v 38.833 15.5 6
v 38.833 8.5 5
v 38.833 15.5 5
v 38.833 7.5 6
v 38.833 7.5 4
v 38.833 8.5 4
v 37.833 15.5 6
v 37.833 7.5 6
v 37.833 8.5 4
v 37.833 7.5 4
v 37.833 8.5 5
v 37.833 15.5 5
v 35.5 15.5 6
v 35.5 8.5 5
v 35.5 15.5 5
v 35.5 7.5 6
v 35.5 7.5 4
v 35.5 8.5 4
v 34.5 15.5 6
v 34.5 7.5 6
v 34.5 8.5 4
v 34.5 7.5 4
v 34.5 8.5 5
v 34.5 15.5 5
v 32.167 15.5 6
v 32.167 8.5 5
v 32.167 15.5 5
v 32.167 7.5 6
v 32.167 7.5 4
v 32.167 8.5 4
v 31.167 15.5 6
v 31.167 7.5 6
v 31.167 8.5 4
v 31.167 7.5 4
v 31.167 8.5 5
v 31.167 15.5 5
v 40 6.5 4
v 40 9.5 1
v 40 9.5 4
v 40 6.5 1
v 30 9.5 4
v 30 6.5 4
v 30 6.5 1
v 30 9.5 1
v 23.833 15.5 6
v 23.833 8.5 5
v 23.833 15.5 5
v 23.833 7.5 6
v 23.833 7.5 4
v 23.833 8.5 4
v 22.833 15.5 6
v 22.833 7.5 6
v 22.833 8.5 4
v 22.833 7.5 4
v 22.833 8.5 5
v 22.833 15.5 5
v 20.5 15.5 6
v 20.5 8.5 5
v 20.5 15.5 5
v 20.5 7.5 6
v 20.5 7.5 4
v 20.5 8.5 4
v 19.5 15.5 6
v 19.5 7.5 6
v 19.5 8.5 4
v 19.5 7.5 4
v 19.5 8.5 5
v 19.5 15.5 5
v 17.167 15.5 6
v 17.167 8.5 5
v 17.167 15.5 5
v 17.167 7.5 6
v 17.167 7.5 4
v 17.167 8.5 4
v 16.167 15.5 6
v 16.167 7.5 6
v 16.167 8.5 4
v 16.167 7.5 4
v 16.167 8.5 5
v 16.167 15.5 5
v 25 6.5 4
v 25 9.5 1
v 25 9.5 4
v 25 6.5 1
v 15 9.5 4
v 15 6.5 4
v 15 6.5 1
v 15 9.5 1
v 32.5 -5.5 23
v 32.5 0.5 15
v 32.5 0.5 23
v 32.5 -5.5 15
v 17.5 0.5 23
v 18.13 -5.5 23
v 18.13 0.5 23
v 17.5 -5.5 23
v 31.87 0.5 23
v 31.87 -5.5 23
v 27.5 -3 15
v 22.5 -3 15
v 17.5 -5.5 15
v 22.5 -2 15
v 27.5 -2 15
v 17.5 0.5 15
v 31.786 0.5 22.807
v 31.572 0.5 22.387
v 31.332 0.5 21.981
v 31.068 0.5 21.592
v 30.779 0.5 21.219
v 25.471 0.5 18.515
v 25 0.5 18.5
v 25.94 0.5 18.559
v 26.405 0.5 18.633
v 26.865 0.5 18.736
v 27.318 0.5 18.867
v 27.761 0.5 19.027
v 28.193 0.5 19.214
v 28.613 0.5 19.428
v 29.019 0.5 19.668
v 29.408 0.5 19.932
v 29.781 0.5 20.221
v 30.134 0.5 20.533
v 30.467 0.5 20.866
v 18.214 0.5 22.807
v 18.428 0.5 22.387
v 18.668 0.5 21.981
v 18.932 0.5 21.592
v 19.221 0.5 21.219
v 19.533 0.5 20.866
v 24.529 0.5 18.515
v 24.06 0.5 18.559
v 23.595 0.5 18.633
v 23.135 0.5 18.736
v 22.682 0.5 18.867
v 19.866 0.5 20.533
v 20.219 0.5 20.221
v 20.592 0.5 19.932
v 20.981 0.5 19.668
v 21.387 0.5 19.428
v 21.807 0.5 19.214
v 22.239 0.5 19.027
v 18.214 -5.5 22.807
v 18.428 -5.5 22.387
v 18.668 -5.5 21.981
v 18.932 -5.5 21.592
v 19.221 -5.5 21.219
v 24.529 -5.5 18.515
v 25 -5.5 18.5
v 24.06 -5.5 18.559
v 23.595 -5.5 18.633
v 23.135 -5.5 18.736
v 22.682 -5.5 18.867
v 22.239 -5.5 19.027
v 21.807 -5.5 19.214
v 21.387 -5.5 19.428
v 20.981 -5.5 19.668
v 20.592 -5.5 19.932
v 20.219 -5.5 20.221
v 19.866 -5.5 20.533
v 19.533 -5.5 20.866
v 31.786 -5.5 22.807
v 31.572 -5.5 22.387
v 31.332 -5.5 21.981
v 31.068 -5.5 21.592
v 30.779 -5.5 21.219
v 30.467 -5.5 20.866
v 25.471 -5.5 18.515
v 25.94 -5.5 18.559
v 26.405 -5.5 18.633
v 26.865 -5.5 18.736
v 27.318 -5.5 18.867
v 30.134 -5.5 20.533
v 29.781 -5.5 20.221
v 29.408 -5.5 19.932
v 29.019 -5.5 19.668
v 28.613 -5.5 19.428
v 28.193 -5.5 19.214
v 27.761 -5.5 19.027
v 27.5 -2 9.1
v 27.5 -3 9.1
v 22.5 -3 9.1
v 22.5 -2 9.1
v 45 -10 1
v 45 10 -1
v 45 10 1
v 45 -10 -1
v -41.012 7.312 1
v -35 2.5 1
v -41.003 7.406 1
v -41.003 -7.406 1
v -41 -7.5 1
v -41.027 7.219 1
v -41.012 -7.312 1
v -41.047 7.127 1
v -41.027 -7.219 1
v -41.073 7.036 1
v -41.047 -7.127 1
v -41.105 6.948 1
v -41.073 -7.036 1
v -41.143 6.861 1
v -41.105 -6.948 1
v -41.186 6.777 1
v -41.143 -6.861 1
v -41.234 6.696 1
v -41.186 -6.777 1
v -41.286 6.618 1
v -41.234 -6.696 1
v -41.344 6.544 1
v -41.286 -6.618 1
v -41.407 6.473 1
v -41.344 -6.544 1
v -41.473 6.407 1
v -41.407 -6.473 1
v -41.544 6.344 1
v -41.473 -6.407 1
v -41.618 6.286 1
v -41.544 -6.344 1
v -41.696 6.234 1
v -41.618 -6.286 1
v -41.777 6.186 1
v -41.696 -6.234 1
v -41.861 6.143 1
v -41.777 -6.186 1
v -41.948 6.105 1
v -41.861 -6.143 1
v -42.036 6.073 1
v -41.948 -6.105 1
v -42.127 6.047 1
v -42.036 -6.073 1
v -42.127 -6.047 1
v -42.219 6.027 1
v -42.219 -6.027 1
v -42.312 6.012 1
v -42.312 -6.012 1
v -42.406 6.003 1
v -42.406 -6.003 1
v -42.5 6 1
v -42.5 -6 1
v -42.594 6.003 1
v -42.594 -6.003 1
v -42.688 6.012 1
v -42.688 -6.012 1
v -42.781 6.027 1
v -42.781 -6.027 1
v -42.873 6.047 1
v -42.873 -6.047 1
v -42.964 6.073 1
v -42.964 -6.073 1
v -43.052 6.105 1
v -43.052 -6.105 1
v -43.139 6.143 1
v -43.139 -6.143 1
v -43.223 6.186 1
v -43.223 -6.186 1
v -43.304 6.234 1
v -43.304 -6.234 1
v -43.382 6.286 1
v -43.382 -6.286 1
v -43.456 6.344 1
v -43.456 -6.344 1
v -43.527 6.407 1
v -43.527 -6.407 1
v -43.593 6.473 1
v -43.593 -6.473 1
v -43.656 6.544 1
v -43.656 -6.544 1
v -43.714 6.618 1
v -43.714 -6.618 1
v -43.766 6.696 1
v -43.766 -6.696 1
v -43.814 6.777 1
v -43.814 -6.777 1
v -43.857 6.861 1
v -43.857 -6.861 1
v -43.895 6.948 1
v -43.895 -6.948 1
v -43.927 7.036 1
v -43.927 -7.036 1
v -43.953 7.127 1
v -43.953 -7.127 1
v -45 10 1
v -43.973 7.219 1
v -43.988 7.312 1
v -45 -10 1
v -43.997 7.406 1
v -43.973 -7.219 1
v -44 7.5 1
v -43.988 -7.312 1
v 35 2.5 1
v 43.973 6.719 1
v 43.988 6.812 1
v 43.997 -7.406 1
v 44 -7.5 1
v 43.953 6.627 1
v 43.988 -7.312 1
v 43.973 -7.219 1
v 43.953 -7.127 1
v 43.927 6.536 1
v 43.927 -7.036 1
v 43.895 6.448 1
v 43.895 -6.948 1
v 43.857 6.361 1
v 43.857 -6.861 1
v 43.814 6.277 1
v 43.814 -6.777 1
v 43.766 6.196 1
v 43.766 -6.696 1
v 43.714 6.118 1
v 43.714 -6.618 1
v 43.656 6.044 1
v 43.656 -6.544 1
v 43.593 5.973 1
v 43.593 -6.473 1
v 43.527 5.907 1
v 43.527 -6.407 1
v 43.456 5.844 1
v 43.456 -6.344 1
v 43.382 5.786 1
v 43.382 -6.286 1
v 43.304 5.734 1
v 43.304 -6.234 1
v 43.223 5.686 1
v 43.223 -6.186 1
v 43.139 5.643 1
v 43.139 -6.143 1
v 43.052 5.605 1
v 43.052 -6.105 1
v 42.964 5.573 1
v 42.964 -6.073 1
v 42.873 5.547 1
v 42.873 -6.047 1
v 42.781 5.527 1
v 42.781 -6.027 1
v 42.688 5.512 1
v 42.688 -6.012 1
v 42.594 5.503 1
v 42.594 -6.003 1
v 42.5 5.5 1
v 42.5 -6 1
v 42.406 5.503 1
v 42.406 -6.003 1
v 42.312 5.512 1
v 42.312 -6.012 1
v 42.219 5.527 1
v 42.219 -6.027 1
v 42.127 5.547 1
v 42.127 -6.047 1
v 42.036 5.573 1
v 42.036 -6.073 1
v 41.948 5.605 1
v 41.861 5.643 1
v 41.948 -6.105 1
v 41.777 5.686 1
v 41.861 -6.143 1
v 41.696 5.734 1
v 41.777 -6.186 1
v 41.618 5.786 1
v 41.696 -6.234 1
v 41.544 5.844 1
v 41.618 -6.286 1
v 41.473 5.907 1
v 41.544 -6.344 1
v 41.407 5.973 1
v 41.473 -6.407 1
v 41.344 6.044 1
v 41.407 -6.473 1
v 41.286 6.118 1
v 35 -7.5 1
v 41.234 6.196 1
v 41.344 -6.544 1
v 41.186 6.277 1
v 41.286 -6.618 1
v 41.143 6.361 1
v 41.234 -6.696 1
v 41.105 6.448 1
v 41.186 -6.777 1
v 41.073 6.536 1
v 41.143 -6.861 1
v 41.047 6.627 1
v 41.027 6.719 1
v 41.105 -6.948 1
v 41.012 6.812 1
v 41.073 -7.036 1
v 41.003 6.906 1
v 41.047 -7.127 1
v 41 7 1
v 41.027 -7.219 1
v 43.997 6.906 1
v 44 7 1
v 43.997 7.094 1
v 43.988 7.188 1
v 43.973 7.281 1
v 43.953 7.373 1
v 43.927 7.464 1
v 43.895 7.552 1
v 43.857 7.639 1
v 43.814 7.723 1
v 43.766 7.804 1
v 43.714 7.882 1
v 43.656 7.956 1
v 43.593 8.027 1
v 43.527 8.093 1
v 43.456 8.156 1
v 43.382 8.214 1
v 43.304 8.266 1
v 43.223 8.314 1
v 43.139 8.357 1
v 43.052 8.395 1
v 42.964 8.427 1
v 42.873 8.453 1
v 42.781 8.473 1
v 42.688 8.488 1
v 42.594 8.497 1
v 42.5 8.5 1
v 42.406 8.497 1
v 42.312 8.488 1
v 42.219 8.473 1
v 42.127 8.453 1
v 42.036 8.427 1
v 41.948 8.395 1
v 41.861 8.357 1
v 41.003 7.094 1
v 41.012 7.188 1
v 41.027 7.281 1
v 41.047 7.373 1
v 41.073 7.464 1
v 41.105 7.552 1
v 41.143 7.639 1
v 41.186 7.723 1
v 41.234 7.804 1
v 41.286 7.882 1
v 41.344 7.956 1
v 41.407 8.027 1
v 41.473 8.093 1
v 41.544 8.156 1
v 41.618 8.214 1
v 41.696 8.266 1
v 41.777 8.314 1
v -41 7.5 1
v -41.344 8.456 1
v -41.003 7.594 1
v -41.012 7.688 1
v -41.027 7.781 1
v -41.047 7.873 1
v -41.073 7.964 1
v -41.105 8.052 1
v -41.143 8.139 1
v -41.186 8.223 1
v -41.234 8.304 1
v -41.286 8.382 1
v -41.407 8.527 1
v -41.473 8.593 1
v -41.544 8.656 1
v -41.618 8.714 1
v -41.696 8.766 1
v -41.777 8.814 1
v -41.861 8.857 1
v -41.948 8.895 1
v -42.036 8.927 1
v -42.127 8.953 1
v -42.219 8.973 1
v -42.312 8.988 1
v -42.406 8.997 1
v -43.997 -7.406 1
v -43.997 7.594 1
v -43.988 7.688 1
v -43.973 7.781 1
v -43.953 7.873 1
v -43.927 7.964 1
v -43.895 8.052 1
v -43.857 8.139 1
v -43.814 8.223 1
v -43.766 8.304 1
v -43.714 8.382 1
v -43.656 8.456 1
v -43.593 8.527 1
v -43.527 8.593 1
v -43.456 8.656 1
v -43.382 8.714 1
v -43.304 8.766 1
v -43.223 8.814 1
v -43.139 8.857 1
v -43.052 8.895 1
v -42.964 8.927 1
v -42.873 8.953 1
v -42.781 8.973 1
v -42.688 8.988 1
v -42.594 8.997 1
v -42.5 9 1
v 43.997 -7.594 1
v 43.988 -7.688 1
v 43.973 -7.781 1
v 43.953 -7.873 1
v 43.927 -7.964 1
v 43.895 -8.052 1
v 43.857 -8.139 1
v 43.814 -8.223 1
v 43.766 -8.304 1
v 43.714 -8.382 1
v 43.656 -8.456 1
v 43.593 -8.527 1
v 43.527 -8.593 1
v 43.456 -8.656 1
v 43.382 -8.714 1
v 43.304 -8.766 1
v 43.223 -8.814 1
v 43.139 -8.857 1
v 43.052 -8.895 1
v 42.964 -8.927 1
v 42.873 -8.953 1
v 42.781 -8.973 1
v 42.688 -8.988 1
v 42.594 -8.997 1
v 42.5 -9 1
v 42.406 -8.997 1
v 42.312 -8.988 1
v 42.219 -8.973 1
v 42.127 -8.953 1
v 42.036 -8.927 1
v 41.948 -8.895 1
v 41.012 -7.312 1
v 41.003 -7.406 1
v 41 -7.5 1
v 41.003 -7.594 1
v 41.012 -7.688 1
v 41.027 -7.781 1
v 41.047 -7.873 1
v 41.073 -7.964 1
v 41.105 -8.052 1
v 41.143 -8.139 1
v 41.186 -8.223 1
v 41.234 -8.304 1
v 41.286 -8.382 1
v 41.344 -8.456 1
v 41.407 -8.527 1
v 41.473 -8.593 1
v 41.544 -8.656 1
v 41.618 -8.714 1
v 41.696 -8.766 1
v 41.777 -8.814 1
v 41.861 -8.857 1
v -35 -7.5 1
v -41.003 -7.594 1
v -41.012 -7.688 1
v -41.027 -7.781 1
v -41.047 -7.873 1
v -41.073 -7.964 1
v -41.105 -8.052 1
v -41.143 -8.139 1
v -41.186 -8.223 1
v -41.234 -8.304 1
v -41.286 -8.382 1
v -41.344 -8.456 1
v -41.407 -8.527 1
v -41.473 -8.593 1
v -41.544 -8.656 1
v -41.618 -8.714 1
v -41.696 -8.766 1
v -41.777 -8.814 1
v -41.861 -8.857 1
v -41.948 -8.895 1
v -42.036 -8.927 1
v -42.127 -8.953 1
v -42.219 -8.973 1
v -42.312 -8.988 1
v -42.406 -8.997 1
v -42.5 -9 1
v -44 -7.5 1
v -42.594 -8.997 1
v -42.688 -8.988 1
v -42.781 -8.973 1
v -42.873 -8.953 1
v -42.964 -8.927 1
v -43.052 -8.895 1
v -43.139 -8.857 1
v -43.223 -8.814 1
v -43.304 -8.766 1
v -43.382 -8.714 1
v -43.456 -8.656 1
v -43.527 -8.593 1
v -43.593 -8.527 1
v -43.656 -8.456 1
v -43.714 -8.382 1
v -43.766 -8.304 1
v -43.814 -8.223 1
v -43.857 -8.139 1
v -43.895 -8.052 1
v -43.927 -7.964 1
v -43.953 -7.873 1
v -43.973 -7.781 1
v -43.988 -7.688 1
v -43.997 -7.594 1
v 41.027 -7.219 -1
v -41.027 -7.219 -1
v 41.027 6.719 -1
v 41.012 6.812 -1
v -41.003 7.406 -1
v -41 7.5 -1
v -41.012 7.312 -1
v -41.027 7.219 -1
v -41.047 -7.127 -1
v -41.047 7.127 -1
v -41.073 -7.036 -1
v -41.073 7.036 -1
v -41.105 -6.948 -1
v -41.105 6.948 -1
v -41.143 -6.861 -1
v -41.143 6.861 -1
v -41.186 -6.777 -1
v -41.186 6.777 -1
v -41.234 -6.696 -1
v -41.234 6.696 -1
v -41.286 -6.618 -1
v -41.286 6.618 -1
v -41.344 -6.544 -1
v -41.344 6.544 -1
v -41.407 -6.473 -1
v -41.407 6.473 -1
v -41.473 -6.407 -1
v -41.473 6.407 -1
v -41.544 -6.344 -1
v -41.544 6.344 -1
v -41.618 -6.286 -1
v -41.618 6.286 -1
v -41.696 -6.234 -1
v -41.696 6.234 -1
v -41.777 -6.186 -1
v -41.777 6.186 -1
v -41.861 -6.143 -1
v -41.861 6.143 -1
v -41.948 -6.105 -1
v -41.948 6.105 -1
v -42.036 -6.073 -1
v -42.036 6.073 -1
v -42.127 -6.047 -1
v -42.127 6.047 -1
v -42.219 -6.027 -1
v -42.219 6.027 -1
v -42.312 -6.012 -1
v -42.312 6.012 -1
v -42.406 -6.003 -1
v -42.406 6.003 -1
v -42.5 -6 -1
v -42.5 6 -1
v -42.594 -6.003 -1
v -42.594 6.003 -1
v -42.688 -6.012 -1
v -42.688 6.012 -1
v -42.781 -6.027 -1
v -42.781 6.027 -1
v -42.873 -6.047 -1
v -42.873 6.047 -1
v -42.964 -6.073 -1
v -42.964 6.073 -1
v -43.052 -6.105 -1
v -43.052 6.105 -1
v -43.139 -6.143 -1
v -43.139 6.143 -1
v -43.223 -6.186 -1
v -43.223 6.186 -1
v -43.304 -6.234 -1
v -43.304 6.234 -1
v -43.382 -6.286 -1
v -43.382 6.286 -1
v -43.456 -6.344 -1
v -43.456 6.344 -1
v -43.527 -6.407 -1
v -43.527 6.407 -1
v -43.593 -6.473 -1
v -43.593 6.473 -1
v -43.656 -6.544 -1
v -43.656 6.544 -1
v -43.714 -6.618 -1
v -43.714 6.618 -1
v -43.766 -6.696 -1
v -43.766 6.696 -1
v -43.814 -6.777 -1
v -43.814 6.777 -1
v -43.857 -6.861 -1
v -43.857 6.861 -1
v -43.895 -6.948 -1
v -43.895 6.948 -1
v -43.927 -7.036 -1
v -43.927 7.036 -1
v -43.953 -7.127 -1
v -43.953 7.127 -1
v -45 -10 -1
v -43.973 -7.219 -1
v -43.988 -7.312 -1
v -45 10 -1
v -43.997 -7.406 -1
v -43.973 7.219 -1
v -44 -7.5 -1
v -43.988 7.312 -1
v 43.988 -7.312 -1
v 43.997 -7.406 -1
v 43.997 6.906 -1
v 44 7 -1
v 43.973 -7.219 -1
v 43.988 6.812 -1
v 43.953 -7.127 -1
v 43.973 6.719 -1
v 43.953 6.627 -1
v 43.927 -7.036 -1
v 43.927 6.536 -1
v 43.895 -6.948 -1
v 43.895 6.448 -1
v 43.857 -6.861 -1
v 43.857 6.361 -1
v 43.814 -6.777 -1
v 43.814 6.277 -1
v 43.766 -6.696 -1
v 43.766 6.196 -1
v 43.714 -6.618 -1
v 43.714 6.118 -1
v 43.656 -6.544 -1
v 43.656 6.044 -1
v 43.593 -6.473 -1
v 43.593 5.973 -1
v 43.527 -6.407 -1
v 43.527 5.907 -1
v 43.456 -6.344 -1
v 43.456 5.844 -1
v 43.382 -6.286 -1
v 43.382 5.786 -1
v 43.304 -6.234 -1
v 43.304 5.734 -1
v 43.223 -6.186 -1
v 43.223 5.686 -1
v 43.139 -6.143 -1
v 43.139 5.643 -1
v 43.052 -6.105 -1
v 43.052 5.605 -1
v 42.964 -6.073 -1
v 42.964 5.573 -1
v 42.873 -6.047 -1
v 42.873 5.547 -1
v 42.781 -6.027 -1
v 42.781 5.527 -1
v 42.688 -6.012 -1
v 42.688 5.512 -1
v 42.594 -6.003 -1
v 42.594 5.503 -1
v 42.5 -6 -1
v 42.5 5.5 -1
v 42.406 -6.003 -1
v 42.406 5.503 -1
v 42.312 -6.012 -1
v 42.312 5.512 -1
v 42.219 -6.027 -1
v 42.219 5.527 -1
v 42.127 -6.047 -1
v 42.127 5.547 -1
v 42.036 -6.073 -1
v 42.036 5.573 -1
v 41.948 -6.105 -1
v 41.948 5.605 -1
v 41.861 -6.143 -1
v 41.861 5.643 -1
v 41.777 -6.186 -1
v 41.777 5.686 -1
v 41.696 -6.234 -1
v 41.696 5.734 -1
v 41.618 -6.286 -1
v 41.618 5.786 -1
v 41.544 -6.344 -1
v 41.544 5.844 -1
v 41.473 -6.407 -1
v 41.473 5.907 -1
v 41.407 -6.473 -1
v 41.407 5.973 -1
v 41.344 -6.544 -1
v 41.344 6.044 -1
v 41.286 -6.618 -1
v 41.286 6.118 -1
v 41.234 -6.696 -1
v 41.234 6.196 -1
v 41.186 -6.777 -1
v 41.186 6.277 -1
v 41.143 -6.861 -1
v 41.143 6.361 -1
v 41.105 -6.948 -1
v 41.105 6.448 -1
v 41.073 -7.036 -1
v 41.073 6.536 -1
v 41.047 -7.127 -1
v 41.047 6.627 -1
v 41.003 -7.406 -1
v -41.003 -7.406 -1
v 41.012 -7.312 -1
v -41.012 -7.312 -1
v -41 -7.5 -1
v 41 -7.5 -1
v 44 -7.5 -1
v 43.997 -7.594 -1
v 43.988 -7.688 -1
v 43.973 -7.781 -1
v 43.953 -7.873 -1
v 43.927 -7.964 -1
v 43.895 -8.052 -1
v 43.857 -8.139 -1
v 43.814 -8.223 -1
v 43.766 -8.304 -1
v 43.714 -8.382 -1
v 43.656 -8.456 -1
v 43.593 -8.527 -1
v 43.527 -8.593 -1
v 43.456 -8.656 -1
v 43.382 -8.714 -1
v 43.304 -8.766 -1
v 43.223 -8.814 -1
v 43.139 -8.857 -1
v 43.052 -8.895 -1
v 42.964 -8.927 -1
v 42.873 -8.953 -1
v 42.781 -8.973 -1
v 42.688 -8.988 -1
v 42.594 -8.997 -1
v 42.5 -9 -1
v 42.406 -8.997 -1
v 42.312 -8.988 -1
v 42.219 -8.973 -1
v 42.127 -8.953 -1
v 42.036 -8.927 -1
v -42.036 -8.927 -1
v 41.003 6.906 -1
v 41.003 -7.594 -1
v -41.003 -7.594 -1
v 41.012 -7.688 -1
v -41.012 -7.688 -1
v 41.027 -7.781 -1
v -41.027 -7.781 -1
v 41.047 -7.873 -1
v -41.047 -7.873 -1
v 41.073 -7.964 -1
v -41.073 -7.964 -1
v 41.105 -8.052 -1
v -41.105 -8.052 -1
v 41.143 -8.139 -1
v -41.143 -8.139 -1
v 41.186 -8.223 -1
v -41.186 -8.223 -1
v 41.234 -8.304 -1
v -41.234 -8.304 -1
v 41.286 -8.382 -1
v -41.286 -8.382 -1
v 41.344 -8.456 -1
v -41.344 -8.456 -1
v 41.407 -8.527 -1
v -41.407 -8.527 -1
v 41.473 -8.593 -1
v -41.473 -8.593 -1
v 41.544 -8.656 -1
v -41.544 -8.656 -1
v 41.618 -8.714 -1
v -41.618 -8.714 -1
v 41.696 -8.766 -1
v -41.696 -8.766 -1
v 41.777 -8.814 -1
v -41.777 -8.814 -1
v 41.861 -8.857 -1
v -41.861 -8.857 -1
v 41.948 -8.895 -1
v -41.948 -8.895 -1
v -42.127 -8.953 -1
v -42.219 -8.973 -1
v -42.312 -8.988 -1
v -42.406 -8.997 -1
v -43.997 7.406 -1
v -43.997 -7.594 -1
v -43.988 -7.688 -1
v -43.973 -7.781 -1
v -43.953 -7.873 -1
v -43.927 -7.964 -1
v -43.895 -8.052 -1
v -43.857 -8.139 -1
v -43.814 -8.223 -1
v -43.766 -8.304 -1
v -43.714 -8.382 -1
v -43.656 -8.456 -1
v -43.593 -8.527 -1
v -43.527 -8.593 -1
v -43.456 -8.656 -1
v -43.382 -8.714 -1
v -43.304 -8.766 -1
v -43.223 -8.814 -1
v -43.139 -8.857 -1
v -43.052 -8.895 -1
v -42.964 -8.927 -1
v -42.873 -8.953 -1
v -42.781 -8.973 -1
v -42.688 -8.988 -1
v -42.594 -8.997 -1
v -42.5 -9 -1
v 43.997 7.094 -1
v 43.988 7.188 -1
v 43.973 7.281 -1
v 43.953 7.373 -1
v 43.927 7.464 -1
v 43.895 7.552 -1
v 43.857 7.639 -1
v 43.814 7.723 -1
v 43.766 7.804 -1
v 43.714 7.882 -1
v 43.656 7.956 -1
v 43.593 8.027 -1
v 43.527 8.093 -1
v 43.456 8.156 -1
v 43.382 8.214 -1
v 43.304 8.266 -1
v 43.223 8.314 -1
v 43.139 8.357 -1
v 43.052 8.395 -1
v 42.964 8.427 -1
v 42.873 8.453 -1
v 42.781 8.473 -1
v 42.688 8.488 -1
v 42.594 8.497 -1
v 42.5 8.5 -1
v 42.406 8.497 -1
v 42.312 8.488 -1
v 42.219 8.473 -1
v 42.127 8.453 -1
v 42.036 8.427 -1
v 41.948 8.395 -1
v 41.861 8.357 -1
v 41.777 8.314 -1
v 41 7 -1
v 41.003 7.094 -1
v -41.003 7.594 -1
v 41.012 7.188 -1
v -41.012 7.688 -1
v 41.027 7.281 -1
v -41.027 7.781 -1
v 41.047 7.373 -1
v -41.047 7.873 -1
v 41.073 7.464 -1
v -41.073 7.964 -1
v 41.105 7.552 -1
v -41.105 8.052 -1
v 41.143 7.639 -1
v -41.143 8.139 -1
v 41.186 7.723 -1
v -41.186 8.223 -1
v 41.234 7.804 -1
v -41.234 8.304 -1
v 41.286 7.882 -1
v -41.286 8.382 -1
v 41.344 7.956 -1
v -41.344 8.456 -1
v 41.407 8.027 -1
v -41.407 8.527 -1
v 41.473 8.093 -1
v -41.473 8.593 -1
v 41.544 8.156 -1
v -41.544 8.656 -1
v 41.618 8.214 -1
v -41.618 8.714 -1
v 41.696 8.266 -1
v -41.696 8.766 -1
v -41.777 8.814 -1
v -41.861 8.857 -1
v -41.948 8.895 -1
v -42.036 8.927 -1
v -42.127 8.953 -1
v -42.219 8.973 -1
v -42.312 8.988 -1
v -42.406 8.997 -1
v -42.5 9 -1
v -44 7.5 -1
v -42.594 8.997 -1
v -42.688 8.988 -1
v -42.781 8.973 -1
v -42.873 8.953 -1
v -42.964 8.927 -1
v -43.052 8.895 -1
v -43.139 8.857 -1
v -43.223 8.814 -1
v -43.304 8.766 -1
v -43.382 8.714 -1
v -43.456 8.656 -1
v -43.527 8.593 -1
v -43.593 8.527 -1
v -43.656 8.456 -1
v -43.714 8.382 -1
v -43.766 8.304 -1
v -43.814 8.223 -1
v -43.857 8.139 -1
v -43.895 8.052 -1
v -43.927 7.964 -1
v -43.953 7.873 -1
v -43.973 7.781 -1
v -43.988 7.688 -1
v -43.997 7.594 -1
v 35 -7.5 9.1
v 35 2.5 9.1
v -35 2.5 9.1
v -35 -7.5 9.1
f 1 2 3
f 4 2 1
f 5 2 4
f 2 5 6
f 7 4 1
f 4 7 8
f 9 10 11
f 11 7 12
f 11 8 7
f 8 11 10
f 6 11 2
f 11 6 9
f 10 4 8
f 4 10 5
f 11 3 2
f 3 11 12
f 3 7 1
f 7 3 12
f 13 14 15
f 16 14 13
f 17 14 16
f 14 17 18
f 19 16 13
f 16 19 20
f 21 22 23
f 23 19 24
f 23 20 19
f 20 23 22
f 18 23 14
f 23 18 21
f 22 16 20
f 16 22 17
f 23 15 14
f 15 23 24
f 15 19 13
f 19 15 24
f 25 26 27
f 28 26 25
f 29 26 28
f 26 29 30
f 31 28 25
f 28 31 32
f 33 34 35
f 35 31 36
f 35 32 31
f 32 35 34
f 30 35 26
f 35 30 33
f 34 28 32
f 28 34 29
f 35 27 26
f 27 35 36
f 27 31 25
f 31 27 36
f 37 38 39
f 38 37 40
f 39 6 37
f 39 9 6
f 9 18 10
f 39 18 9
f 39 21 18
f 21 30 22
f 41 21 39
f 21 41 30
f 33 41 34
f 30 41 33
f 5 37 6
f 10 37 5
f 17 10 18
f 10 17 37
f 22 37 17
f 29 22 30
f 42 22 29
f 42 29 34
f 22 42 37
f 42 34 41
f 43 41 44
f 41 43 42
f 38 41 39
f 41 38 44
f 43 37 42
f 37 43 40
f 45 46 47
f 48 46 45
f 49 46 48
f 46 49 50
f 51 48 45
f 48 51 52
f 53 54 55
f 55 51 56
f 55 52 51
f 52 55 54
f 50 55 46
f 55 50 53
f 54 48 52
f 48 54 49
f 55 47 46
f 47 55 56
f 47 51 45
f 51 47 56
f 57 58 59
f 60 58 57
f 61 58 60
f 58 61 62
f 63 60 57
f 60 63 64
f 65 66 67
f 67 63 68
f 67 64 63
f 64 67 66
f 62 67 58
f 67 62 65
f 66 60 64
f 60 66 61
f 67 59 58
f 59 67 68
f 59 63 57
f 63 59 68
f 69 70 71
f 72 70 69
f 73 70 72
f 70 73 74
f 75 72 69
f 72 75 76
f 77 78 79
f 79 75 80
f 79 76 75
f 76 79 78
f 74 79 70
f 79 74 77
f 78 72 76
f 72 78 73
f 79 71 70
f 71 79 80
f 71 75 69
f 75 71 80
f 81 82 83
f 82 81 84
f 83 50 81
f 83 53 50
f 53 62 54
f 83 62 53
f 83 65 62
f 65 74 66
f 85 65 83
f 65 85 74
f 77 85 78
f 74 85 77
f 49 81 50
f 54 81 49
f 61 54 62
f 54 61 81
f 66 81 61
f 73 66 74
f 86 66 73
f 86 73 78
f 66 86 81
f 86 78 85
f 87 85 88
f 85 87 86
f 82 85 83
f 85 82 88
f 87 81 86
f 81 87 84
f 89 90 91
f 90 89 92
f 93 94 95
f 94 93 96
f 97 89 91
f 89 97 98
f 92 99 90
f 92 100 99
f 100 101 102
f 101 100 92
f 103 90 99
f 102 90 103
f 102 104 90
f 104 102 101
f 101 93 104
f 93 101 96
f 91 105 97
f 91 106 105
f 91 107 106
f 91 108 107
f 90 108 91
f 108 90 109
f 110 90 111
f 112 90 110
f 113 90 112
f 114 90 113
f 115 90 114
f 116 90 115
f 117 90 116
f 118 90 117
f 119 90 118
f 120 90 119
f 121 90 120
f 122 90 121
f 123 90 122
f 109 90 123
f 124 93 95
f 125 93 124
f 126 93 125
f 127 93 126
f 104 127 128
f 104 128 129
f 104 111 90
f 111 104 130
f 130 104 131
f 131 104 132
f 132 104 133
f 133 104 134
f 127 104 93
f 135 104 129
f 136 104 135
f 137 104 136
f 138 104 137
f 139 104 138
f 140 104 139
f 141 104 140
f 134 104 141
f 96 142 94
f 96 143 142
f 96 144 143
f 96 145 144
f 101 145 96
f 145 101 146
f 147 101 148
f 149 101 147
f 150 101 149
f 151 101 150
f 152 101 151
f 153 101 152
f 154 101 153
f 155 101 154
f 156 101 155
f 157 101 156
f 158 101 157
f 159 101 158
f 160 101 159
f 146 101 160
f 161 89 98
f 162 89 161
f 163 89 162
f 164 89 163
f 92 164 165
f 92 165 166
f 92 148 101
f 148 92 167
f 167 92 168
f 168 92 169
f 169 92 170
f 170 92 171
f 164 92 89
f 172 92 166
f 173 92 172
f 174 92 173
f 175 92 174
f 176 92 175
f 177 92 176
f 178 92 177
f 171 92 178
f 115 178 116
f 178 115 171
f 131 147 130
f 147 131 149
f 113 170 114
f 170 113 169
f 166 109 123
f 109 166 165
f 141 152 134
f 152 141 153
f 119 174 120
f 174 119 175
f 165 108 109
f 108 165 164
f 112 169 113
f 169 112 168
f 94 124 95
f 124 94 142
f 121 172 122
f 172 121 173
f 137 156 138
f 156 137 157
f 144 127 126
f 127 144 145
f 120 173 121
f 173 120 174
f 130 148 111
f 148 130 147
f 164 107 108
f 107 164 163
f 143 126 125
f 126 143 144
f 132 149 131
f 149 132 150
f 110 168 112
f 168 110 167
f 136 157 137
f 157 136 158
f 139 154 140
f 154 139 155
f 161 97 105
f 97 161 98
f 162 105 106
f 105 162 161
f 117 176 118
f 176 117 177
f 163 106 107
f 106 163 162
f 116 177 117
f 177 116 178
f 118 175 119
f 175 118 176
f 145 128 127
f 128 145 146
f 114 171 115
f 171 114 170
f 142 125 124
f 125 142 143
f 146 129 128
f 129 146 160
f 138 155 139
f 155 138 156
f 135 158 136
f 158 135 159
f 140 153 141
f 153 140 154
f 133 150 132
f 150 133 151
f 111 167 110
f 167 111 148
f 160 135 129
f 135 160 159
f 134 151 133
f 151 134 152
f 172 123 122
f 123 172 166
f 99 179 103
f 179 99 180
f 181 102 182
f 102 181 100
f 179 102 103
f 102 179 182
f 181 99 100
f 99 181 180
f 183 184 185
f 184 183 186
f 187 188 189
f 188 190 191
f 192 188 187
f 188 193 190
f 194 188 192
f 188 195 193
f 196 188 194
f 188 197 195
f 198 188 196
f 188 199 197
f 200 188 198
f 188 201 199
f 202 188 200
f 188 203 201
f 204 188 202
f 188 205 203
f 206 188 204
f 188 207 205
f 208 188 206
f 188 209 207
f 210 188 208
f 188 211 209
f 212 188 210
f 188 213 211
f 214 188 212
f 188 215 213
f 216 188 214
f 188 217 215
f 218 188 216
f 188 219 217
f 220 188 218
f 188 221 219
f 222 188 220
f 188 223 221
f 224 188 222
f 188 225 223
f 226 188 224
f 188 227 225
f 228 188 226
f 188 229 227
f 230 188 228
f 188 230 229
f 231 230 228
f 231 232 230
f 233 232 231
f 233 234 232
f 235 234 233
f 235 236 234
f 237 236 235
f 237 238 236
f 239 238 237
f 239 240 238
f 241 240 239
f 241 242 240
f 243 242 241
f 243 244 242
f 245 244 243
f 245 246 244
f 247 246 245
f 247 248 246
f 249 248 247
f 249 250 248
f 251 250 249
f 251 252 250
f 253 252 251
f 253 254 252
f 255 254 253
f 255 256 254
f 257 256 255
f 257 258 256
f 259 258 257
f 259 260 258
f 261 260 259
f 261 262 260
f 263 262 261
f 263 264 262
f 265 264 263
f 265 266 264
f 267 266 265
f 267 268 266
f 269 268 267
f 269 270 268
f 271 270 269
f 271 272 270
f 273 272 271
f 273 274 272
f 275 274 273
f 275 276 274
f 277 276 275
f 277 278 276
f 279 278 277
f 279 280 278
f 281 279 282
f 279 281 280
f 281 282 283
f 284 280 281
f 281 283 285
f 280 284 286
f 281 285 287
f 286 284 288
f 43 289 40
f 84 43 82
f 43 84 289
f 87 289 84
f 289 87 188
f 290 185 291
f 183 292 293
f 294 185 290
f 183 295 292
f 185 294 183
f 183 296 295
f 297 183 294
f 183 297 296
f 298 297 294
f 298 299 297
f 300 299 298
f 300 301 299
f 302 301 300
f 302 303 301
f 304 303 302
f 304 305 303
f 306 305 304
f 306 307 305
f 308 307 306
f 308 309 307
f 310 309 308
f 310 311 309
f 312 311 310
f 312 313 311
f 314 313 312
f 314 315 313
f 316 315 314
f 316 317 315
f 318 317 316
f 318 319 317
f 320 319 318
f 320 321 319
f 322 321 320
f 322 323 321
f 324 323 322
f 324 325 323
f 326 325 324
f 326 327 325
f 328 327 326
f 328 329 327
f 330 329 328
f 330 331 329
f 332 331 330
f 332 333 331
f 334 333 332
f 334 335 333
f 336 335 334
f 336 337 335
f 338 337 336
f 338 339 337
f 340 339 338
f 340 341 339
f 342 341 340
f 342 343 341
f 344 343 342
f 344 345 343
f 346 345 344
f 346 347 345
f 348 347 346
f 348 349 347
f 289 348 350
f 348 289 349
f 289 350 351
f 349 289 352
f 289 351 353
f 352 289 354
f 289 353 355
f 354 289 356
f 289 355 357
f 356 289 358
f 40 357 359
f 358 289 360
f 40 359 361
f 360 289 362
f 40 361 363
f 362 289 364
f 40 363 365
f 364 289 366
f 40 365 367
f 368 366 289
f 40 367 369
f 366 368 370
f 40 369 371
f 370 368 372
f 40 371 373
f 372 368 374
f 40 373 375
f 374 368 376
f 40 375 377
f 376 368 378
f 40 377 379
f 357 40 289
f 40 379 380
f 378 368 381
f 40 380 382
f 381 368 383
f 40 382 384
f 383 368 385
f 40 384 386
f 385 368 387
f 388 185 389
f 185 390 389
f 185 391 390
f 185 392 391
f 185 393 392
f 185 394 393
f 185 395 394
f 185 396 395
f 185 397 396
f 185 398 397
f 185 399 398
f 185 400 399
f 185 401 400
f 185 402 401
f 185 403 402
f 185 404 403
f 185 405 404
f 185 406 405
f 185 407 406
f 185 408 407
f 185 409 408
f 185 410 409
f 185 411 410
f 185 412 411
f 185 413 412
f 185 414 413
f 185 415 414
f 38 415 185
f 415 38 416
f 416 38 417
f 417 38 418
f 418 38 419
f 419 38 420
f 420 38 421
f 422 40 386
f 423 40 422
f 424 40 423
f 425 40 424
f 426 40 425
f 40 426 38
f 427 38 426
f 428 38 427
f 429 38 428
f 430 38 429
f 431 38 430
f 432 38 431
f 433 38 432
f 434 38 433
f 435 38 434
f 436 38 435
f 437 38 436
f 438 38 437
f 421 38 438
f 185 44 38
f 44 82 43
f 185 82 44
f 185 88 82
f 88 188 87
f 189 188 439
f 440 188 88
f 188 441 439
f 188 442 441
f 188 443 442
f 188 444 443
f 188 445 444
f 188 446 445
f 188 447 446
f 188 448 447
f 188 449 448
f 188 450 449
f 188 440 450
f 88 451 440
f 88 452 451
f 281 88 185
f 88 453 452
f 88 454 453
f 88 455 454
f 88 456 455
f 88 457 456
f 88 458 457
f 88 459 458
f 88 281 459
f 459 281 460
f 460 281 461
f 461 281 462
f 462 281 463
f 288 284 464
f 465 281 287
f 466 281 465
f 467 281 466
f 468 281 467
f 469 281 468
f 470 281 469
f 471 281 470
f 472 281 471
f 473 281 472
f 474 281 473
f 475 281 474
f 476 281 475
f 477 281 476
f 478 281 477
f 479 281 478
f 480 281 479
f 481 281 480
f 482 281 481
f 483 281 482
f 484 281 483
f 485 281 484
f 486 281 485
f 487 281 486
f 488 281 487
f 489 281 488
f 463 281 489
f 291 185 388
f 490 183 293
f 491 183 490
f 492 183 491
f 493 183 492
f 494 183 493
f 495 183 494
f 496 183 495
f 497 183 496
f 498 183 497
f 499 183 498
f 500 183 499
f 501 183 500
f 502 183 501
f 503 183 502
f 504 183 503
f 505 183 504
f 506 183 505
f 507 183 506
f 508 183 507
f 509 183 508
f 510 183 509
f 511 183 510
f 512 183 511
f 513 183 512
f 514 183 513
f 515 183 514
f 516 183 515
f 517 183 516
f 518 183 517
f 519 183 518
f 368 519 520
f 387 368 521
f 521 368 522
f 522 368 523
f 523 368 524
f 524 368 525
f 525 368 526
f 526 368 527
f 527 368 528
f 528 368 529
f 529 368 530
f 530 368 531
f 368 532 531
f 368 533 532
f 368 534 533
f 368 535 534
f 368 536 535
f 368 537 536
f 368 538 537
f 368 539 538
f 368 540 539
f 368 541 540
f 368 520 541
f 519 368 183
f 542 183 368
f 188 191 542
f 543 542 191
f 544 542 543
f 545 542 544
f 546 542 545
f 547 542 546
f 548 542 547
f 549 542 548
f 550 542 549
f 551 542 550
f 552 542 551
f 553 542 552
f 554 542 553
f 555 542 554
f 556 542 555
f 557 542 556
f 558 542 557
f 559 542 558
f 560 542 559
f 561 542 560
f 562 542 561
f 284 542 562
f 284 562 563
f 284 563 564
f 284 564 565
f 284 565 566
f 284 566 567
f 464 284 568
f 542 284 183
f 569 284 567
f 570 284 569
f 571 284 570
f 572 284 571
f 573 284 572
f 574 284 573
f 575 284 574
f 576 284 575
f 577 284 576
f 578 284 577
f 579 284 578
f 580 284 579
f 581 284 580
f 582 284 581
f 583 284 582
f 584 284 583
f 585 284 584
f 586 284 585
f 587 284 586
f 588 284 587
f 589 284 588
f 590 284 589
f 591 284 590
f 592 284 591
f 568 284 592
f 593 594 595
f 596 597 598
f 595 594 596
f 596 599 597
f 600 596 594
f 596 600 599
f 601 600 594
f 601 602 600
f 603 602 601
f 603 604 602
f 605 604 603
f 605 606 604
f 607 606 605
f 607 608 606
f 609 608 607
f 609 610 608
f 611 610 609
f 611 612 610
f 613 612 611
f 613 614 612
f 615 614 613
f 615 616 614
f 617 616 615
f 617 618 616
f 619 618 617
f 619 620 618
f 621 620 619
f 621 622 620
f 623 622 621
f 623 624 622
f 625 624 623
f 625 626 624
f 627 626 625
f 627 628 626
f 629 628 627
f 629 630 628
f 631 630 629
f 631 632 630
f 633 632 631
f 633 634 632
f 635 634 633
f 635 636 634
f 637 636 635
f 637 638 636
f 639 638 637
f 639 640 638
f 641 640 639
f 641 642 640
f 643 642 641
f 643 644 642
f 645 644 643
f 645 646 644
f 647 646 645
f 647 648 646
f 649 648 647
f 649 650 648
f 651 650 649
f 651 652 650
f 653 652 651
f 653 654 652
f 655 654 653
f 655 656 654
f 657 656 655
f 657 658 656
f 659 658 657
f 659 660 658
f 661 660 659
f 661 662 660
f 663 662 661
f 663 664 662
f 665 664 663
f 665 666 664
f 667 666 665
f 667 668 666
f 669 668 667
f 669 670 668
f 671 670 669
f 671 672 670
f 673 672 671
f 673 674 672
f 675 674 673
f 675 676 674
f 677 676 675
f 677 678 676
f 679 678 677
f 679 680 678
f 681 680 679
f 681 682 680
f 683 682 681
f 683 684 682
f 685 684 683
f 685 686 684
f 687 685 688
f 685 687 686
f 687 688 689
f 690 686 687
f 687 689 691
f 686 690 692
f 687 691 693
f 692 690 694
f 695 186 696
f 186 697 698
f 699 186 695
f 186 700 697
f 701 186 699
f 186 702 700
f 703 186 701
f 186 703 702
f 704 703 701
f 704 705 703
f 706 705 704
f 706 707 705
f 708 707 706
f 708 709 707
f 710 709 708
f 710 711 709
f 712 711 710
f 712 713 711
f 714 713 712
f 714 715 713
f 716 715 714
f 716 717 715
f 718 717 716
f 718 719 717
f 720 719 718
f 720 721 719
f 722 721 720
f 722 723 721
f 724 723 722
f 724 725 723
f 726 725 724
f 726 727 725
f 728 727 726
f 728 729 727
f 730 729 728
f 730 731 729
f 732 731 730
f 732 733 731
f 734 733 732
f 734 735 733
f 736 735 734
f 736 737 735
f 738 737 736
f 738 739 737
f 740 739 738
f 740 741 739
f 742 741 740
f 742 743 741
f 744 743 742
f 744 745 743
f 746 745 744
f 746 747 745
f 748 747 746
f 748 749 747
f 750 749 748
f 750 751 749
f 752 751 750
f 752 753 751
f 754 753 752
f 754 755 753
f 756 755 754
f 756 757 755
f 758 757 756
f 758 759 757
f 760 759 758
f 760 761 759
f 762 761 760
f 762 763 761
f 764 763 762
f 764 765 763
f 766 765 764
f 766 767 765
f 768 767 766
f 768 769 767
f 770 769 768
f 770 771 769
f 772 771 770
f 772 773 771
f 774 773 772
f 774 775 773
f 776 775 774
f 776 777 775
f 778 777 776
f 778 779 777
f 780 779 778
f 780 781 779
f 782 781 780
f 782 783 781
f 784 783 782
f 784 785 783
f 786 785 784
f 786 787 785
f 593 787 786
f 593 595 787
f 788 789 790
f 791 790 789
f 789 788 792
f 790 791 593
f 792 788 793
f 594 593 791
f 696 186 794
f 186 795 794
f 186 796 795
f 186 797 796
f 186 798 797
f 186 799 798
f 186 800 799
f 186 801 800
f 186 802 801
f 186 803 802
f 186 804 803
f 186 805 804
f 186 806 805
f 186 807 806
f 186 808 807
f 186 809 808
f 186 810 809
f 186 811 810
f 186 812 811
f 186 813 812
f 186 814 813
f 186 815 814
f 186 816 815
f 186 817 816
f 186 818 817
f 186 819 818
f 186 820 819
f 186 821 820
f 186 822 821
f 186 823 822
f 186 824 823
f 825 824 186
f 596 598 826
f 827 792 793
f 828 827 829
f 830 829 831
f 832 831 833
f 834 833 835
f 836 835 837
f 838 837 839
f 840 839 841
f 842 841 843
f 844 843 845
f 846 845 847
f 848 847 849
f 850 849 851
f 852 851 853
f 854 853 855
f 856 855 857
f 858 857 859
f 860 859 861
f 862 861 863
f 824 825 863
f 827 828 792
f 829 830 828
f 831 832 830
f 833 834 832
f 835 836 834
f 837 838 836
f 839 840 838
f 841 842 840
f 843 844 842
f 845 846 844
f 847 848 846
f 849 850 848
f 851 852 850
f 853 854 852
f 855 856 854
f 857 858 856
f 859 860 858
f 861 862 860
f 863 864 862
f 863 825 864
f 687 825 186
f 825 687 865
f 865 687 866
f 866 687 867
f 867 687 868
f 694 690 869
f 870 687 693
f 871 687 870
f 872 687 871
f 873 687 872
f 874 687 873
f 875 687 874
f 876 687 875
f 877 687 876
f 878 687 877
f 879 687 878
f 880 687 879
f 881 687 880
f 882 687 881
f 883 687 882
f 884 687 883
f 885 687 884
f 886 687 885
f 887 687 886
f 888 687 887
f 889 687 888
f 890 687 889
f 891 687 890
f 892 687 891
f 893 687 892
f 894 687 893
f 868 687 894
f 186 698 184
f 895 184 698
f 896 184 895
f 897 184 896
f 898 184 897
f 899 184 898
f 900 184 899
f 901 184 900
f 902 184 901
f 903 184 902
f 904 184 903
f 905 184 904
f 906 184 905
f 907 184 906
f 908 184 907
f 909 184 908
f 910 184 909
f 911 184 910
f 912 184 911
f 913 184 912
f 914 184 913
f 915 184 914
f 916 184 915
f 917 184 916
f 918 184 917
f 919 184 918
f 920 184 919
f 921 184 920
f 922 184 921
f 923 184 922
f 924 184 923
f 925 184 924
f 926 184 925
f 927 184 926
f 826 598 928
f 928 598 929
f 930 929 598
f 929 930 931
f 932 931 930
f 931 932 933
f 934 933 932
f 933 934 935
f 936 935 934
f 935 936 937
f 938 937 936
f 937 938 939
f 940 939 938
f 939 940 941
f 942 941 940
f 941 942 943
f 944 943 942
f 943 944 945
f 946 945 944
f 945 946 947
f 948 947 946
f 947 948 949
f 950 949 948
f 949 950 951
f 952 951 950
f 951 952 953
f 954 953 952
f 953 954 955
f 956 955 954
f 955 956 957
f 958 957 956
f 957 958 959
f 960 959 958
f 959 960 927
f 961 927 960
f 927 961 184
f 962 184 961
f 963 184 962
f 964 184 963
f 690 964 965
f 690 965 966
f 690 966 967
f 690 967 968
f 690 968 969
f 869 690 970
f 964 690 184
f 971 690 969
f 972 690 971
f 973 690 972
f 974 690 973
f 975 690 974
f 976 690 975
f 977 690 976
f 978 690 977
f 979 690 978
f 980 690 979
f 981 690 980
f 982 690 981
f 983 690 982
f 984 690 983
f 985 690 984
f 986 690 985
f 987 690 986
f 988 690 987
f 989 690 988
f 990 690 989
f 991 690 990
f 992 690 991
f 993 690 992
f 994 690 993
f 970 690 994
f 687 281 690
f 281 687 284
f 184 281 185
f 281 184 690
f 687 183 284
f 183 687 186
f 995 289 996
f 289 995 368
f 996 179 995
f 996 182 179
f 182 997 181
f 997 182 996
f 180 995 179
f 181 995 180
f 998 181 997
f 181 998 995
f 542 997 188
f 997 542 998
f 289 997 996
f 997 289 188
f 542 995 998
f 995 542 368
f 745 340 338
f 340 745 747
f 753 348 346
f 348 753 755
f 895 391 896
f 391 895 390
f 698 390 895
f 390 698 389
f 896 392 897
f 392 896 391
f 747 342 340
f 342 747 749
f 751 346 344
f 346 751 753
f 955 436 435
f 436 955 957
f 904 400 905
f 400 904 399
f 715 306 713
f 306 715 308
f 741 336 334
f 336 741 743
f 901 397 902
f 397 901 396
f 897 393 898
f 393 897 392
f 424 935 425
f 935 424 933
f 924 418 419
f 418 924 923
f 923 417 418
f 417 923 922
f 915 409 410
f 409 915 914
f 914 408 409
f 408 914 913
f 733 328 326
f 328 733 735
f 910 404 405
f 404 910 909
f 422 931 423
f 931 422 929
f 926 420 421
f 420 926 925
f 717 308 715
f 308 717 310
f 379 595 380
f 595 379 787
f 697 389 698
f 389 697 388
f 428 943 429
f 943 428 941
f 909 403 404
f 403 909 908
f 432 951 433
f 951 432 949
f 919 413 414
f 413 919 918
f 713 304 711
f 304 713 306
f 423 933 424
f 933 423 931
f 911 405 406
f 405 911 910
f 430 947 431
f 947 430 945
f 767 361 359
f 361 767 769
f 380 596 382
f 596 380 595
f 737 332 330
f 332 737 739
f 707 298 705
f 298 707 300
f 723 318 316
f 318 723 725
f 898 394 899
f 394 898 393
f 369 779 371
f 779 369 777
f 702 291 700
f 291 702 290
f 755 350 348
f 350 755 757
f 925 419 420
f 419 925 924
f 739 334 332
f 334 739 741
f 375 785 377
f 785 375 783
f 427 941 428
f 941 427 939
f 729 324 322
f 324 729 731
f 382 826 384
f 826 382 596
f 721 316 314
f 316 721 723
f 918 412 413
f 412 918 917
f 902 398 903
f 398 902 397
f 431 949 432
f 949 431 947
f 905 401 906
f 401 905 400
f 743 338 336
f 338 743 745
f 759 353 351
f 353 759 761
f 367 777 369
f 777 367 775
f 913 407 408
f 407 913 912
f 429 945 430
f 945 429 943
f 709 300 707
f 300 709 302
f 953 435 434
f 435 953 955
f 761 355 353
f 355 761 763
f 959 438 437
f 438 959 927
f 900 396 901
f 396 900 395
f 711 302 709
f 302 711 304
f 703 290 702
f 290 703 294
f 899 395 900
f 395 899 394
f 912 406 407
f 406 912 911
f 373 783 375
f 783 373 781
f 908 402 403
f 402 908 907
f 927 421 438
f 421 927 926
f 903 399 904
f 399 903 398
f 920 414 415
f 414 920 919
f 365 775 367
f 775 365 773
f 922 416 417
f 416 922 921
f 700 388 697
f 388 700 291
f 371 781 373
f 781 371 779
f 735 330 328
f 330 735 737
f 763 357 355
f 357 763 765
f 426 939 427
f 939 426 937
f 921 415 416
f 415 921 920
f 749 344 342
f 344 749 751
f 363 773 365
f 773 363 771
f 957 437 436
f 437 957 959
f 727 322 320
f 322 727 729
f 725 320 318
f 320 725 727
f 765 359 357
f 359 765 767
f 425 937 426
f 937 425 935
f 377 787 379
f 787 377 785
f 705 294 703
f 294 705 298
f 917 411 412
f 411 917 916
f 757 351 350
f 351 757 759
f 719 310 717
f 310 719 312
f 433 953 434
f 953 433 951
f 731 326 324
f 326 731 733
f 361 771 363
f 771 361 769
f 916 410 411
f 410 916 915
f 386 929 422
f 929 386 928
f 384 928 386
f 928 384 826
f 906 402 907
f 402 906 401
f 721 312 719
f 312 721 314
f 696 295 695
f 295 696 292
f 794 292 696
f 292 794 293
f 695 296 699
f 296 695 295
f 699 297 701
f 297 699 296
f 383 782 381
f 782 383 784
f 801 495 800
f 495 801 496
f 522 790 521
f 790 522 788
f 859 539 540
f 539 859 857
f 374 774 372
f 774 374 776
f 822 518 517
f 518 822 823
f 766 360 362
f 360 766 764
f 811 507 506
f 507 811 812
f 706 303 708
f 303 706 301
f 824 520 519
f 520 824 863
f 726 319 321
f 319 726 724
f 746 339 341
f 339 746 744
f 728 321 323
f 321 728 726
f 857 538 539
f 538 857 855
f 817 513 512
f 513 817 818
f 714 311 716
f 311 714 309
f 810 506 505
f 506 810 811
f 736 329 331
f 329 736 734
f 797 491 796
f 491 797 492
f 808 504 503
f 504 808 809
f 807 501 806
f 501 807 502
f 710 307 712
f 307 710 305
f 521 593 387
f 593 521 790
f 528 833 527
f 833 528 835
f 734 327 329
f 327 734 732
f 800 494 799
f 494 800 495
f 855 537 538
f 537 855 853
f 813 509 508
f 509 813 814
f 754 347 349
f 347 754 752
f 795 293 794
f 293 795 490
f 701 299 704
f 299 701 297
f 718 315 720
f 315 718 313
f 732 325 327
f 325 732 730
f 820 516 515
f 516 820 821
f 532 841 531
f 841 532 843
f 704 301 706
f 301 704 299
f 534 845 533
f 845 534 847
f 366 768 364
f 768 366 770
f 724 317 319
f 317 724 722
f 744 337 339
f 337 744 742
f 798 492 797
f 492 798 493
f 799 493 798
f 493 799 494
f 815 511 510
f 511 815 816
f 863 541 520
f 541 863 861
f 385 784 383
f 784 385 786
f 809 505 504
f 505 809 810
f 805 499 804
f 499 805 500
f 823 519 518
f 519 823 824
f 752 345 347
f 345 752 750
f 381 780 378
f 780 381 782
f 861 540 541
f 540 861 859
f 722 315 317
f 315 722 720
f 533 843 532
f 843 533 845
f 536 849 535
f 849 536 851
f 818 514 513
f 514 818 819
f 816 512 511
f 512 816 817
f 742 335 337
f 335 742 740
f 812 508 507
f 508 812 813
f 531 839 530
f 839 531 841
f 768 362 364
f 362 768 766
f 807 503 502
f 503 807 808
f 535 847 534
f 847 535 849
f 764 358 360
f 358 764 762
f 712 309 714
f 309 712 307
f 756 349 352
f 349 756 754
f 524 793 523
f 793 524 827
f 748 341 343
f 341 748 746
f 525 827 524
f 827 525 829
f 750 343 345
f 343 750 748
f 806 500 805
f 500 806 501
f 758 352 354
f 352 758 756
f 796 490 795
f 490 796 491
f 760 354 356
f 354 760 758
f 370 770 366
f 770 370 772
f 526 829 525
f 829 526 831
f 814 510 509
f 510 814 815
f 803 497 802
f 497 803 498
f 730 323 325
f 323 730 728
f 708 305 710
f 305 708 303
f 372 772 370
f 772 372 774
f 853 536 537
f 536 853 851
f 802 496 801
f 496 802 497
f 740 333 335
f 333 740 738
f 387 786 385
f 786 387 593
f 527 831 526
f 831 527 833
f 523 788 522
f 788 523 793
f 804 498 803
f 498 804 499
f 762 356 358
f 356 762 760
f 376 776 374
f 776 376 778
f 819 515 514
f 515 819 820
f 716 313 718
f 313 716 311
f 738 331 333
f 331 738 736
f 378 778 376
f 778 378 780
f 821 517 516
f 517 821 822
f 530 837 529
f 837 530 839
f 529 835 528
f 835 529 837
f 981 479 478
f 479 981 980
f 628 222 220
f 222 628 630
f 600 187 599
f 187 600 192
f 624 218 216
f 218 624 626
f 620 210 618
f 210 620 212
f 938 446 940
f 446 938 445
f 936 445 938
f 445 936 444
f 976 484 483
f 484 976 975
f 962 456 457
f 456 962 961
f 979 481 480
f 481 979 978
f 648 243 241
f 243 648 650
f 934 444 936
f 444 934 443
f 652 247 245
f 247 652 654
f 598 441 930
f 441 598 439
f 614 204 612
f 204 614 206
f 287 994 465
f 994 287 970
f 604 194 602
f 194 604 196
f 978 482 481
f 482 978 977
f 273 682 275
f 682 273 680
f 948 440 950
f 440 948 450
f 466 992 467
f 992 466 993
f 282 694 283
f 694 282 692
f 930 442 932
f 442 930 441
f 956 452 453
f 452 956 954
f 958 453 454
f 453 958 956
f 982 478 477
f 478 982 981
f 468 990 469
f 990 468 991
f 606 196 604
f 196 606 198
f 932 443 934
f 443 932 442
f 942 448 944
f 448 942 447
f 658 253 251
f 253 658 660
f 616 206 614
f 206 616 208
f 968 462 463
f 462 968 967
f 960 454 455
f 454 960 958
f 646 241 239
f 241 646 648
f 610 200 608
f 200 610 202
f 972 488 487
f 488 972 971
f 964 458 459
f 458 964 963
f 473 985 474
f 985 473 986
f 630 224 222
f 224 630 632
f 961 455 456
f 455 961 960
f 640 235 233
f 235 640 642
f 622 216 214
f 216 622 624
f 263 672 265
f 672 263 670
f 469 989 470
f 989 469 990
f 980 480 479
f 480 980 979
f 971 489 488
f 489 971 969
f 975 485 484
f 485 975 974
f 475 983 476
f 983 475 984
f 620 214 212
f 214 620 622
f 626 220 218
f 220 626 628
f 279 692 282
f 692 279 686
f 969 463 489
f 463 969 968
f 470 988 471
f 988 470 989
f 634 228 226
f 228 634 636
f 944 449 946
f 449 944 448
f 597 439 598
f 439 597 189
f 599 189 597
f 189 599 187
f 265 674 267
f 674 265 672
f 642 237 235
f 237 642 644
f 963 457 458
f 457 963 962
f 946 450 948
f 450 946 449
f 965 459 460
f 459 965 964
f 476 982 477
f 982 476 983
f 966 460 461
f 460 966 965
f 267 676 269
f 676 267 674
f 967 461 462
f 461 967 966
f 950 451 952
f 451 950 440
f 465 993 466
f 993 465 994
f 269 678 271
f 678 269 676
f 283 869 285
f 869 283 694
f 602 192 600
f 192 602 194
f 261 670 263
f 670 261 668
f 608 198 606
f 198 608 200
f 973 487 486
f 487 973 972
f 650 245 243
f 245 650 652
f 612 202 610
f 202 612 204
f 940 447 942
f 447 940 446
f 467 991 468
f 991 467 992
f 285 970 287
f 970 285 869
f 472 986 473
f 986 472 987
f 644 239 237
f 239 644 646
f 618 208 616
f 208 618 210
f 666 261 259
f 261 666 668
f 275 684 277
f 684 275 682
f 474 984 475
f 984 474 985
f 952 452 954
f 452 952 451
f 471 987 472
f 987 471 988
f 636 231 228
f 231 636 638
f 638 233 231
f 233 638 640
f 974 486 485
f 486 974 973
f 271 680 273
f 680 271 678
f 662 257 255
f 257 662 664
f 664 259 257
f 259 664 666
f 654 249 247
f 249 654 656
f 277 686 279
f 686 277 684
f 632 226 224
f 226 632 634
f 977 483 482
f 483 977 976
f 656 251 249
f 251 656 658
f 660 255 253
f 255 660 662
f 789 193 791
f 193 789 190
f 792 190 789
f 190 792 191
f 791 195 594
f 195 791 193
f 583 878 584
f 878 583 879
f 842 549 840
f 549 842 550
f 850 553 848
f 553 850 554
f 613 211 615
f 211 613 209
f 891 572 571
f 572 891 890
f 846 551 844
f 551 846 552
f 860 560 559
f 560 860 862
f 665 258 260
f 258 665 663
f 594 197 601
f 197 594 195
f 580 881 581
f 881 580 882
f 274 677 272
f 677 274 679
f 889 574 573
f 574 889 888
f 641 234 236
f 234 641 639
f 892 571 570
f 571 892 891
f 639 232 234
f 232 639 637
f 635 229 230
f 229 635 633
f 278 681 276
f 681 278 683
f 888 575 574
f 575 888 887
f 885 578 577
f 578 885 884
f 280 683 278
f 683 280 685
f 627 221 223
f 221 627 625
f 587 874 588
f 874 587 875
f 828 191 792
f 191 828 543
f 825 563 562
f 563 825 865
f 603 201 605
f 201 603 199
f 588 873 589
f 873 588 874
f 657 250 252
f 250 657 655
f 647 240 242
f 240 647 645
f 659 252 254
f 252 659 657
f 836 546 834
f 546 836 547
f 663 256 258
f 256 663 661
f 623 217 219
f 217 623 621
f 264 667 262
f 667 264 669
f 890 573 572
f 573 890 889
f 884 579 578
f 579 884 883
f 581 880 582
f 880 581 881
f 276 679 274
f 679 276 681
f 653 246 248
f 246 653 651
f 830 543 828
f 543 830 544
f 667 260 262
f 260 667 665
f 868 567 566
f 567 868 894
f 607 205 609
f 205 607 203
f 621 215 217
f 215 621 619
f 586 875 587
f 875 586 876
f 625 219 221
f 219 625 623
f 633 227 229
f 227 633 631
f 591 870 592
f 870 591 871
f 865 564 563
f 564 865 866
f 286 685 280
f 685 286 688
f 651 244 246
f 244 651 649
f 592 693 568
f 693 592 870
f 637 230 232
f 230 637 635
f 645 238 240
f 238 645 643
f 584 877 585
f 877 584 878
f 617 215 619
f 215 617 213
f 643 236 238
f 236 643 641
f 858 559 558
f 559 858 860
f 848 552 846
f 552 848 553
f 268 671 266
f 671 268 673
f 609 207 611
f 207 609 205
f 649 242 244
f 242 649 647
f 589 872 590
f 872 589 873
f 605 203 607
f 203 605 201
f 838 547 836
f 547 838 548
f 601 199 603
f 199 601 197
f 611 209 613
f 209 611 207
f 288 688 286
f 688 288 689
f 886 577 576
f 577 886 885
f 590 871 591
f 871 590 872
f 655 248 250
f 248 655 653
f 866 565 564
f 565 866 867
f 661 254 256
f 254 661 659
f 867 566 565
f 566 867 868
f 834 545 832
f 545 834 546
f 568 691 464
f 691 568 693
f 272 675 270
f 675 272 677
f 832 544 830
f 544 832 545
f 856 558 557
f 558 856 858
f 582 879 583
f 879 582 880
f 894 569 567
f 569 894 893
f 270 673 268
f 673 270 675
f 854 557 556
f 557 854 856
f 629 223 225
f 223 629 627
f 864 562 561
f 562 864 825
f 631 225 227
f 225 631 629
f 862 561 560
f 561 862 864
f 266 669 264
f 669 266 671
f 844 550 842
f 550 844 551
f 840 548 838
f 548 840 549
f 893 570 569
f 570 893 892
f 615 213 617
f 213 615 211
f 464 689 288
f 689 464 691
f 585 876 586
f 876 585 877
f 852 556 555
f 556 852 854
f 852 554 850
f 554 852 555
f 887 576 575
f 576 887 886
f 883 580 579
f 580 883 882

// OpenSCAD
//https://www.aliexpress.com/item/32672118555.html
spodok_dlzka = 90;
spodok_sirka = 20;
spodok_hrubka = 2;

piny_dlzka = 10;
piny_sirka = 3;
piny_hrubka = 4;

diera_d = 3 ; // d = diameter -> priemer

module diera()
{
    cylinder (h = 8, d = diera_d, center = true, $fn=100);
}
module spodok() 
{
    color( "red", 1.0 )
     cube([spodok_dlzka,spodok_sirka,spodok_hrubka], true);
}

module Lko()
{
   color( "silver", 1.0 )
    {
    translate([0,0,-3/2+1])
     cube([1,1,3], true);
    translate([-0.5,-0.5,0])
        cube([1,8,1], false);
    }
}

module buxa() //krabica na piny
{
    color( "black", 1.0 )
     cube([piny_dlzka,piny_sirka,piny_hrubka], true);
    
}

module piny()
{
    buxa();
    translate([piny_dlzka/3,0,piny_hrubka-1])
     Lko();
    translate([0,0,piny_hrubka-1])
     Lko();
    translate([-piny_dlzka/3,0,piny_hrubka-1])
     Lko();
}

module krabica() //sranda s posuvnou srandou
{
    color( "gray", 1.0 )
     cube([spodok_dlzka-20,spodok_sirka/2,      spodok_hrubka*5], true);
}

module cindzik() //to je ta sranda ktora sa posuva
{
    color( "silver", 1.0 )
    translate([0,0,10/2])
    cube([5,1,10], true);
    color( "yellow", 1.0 )
    difference()
    {
        translate([0,0,14])
        cube([15,6,8], true);
        translate([0,0,21])
            rotate ([90,0,0])
                cylinder (h = 10, r=7.5, center = true, $fn=100);
    }  
}

module diery()
{
    translate([spodok_dlzka/2 - 2.5,spodok_sirka/2 - 3,0])
     diera();
    
    translate([spodok_dlzka/2 - 2.5,-spodok_sirka/2 + 2.5,0])
     diera();
    
    translate([-spodok_dlzka/2 + 2.5,spodok_sirka/2 -2.5,0])
     diera();
    
    translate([-spodok_dlzka/2 + 2.5,-spodok_sirka/2 + 2.5,0])
     diera();
}
module celok()
{
   spodok();
   translate([spodok_dlzka/2 - piny_dlzka/2 - 5,spodok_sirka/2 - 2,piny_hrubka/2])
    piny(); 
    
   translate([spodok_dlzka/2 - piny_dlzka/2 - 5 - piny_dlzka*1.5,spodok_sirka/2 - 2,piny_hrubka/2])
    piny(); 
    
    translate([0,-2.5,spodok_hrubka*5/2 - 0.9])
    krabica();
    
    translate([spodok_dlzka/2 - 20,-2.5,spodok_hrubka*5/2])
    cindzik();
}


difference() 
{
celok();
diery();
}
